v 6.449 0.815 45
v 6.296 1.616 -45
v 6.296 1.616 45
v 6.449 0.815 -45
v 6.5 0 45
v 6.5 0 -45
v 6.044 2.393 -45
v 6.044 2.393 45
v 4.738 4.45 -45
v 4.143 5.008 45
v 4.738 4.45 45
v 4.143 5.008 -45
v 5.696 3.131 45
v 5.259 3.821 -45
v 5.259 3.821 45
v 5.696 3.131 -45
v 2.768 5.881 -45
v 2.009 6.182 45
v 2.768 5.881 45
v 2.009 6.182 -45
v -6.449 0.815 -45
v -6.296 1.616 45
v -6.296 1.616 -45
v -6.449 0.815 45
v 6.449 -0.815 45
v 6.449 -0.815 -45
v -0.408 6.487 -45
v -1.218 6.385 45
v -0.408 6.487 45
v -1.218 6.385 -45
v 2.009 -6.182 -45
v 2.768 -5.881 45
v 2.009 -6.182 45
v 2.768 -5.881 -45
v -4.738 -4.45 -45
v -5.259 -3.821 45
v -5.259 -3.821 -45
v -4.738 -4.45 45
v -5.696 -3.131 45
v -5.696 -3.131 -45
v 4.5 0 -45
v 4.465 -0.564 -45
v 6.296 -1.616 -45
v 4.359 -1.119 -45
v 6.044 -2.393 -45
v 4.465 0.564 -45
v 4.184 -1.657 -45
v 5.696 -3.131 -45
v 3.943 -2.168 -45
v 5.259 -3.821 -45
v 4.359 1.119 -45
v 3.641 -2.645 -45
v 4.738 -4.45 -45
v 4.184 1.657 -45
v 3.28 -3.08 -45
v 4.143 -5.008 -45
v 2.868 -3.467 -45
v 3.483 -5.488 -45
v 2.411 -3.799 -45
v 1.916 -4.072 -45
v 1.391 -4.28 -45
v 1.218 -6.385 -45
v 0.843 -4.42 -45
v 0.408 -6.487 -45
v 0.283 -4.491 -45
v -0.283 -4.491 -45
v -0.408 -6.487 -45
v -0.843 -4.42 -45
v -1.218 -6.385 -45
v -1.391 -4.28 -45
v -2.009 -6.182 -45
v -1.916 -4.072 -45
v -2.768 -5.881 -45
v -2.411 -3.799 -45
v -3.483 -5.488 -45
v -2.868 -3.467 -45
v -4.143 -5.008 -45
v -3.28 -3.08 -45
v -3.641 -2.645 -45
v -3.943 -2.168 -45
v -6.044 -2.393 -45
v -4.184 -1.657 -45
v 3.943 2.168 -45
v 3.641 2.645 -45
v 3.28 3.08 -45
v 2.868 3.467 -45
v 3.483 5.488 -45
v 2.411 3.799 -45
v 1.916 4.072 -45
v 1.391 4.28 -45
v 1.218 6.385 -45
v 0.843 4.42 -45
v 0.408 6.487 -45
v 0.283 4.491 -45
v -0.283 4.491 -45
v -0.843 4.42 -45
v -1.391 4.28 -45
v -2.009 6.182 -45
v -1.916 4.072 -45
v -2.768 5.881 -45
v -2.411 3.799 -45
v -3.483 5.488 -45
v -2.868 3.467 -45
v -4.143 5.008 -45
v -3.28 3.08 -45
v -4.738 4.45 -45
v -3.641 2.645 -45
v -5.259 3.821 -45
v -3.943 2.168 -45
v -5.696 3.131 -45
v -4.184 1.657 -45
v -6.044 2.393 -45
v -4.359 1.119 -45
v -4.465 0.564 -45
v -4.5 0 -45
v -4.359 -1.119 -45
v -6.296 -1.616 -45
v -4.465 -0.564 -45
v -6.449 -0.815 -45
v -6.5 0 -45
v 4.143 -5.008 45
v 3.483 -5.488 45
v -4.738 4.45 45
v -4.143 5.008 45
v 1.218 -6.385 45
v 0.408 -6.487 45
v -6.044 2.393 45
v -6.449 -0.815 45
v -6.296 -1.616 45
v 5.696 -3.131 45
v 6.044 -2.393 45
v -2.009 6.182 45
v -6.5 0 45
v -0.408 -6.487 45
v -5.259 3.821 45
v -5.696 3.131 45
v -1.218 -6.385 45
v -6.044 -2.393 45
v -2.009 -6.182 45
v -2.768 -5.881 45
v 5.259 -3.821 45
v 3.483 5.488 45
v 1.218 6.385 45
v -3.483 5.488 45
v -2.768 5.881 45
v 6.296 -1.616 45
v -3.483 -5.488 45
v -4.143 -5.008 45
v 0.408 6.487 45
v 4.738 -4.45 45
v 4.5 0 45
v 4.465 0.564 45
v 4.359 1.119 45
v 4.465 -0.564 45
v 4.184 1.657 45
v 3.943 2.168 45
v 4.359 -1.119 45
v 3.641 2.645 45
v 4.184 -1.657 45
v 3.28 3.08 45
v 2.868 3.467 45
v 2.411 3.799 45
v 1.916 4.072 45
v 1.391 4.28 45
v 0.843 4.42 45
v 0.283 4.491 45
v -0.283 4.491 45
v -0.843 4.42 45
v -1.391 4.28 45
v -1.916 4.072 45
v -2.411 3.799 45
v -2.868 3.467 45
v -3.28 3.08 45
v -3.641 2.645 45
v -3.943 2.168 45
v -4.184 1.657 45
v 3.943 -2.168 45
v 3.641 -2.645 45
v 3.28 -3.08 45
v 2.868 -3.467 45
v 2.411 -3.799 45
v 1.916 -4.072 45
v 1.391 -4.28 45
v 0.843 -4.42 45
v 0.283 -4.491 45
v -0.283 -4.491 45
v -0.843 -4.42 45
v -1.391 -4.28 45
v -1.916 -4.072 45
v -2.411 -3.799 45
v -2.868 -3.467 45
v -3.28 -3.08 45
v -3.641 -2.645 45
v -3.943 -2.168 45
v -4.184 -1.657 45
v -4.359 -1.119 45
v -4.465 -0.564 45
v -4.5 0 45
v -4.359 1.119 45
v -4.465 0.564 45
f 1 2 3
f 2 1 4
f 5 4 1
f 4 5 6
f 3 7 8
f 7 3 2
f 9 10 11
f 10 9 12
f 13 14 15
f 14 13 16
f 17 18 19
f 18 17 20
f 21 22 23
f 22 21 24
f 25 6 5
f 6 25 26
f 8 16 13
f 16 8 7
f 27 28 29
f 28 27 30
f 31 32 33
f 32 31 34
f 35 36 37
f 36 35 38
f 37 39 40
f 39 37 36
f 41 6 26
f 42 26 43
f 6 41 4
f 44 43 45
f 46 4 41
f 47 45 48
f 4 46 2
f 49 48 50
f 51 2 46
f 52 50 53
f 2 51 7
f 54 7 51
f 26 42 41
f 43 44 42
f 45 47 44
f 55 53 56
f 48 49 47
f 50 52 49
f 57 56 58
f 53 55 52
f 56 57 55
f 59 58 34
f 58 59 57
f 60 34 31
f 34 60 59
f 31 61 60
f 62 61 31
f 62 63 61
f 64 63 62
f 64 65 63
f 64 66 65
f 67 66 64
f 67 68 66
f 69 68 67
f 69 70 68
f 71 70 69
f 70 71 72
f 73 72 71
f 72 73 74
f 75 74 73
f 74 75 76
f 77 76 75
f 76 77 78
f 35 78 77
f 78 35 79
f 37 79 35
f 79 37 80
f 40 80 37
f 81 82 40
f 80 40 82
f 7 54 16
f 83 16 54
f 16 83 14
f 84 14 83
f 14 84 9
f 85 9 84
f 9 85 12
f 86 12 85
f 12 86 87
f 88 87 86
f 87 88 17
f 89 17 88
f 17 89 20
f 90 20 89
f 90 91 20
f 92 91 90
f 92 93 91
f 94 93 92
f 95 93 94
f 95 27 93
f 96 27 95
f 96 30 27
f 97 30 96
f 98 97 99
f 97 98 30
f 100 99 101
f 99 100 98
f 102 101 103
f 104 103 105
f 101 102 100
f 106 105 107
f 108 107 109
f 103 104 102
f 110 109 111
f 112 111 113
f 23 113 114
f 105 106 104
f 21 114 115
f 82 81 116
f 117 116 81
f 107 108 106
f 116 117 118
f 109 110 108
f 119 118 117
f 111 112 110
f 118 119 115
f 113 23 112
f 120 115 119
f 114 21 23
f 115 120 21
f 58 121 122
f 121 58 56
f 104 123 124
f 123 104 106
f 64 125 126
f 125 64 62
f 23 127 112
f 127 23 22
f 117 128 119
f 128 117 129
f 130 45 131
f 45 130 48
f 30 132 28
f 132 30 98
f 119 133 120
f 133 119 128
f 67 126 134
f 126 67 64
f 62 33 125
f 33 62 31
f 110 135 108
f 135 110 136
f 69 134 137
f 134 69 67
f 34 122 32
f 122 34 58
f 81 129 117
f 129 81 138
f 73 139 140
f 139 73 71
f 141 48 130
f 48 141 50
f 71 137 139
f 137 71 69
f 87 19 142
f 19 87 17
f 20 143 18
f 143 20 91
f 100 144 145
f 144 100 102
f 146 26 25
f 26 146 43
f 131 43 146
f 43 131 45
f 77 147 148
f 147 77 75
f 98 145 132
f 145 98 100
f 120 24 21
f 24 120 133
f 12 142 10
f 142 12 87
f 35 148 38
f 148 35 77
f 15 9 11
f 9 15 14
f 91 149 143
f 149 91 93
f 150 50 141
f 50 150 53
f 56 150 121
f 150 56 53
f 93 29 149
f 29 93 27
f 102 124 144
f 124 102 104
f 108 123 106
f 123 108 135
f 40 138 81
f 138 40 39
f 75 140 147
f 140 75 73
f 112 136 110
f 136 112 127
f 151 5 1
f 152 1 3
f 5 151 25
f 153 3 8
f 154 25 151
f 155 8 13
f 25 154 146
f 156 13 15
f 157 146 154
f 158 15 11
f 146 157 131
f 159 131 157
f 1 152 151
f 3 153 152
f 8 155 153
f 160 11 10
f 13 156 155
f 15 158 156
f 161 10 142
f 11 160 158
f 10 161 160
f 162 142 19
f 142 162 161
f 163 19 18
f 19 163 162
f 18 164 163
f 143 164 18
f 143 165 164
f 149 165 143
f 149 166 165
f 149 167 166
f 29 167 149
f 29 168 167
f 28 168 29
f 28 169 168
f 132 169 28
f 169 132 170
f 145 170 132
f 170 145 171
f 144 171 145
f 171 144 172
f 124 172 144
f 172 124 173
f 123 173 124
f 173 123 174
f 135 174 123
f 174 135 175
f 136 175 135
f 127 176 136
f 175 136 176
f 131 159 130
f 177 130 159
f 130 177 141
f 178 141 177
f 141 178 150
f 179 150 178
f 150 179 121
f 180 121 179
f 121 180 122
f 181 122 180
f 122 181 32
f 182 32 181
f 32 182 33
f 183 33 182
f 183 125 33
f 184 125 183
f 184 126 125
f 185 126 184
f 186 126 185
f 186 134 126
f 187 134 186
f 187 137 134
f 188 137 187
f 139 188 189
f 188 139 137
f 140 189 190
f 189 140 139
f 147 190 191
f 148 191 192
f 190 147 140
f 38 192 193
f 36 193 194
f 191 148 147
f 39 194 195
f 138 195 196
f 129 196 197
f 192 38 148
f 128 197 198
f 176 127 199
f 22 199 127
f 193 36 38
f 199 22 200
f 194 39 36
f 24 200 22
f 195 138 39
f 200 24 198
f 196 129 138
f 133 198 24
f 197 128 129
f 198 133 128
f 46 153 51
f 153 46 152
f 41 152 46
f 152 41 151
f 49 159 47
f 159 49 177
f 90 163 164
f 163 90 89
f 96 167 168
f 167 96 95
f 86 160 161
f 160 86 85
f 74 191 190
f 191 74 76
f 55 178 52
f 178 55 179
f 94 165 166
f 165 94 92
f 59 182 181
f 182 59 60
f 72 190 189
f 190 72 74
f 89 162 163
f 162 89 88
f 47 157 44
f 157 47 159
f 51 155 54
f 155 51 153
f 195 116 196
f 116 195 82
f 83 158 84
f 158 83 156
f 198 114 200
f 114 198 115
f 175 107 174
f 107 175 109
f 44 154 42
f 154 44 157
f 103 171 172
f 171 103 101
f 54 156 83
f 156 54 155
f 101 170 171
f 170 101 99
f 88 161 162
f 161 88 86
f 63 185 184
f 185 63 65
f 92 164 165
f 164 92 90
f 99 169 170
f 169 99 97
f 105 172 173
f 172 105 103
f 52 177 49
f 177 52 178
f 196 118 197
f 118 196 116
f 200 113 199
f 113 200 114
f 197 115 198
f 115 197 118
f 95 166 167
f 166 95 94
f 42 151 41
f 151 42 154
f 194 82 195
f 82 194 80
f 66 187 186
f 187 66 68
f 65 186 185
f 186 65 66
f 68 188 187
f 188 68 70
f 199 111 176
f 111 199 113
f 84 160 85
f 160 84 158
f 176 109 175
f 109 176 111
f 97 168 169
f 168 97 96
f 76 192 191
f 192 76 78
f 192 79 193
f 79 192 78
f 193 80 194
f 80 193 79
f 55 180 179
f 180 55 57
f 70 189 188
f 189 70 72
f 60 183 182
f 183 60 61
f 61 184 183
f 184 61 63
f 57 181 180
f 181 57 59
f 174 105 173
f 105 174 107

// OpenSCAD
$fn = 50;


difference() {
	union() {
		translate(v = [0, 0, -45.0000000000]) {
			cylinder(h = 90, r = 6.5000000000);
		}
	}
	union() {
		translate(v = [0, 0, -100.0000000000]) {
			cylinder(h = 200, r = 4.5000000000);
		}
	}
}
